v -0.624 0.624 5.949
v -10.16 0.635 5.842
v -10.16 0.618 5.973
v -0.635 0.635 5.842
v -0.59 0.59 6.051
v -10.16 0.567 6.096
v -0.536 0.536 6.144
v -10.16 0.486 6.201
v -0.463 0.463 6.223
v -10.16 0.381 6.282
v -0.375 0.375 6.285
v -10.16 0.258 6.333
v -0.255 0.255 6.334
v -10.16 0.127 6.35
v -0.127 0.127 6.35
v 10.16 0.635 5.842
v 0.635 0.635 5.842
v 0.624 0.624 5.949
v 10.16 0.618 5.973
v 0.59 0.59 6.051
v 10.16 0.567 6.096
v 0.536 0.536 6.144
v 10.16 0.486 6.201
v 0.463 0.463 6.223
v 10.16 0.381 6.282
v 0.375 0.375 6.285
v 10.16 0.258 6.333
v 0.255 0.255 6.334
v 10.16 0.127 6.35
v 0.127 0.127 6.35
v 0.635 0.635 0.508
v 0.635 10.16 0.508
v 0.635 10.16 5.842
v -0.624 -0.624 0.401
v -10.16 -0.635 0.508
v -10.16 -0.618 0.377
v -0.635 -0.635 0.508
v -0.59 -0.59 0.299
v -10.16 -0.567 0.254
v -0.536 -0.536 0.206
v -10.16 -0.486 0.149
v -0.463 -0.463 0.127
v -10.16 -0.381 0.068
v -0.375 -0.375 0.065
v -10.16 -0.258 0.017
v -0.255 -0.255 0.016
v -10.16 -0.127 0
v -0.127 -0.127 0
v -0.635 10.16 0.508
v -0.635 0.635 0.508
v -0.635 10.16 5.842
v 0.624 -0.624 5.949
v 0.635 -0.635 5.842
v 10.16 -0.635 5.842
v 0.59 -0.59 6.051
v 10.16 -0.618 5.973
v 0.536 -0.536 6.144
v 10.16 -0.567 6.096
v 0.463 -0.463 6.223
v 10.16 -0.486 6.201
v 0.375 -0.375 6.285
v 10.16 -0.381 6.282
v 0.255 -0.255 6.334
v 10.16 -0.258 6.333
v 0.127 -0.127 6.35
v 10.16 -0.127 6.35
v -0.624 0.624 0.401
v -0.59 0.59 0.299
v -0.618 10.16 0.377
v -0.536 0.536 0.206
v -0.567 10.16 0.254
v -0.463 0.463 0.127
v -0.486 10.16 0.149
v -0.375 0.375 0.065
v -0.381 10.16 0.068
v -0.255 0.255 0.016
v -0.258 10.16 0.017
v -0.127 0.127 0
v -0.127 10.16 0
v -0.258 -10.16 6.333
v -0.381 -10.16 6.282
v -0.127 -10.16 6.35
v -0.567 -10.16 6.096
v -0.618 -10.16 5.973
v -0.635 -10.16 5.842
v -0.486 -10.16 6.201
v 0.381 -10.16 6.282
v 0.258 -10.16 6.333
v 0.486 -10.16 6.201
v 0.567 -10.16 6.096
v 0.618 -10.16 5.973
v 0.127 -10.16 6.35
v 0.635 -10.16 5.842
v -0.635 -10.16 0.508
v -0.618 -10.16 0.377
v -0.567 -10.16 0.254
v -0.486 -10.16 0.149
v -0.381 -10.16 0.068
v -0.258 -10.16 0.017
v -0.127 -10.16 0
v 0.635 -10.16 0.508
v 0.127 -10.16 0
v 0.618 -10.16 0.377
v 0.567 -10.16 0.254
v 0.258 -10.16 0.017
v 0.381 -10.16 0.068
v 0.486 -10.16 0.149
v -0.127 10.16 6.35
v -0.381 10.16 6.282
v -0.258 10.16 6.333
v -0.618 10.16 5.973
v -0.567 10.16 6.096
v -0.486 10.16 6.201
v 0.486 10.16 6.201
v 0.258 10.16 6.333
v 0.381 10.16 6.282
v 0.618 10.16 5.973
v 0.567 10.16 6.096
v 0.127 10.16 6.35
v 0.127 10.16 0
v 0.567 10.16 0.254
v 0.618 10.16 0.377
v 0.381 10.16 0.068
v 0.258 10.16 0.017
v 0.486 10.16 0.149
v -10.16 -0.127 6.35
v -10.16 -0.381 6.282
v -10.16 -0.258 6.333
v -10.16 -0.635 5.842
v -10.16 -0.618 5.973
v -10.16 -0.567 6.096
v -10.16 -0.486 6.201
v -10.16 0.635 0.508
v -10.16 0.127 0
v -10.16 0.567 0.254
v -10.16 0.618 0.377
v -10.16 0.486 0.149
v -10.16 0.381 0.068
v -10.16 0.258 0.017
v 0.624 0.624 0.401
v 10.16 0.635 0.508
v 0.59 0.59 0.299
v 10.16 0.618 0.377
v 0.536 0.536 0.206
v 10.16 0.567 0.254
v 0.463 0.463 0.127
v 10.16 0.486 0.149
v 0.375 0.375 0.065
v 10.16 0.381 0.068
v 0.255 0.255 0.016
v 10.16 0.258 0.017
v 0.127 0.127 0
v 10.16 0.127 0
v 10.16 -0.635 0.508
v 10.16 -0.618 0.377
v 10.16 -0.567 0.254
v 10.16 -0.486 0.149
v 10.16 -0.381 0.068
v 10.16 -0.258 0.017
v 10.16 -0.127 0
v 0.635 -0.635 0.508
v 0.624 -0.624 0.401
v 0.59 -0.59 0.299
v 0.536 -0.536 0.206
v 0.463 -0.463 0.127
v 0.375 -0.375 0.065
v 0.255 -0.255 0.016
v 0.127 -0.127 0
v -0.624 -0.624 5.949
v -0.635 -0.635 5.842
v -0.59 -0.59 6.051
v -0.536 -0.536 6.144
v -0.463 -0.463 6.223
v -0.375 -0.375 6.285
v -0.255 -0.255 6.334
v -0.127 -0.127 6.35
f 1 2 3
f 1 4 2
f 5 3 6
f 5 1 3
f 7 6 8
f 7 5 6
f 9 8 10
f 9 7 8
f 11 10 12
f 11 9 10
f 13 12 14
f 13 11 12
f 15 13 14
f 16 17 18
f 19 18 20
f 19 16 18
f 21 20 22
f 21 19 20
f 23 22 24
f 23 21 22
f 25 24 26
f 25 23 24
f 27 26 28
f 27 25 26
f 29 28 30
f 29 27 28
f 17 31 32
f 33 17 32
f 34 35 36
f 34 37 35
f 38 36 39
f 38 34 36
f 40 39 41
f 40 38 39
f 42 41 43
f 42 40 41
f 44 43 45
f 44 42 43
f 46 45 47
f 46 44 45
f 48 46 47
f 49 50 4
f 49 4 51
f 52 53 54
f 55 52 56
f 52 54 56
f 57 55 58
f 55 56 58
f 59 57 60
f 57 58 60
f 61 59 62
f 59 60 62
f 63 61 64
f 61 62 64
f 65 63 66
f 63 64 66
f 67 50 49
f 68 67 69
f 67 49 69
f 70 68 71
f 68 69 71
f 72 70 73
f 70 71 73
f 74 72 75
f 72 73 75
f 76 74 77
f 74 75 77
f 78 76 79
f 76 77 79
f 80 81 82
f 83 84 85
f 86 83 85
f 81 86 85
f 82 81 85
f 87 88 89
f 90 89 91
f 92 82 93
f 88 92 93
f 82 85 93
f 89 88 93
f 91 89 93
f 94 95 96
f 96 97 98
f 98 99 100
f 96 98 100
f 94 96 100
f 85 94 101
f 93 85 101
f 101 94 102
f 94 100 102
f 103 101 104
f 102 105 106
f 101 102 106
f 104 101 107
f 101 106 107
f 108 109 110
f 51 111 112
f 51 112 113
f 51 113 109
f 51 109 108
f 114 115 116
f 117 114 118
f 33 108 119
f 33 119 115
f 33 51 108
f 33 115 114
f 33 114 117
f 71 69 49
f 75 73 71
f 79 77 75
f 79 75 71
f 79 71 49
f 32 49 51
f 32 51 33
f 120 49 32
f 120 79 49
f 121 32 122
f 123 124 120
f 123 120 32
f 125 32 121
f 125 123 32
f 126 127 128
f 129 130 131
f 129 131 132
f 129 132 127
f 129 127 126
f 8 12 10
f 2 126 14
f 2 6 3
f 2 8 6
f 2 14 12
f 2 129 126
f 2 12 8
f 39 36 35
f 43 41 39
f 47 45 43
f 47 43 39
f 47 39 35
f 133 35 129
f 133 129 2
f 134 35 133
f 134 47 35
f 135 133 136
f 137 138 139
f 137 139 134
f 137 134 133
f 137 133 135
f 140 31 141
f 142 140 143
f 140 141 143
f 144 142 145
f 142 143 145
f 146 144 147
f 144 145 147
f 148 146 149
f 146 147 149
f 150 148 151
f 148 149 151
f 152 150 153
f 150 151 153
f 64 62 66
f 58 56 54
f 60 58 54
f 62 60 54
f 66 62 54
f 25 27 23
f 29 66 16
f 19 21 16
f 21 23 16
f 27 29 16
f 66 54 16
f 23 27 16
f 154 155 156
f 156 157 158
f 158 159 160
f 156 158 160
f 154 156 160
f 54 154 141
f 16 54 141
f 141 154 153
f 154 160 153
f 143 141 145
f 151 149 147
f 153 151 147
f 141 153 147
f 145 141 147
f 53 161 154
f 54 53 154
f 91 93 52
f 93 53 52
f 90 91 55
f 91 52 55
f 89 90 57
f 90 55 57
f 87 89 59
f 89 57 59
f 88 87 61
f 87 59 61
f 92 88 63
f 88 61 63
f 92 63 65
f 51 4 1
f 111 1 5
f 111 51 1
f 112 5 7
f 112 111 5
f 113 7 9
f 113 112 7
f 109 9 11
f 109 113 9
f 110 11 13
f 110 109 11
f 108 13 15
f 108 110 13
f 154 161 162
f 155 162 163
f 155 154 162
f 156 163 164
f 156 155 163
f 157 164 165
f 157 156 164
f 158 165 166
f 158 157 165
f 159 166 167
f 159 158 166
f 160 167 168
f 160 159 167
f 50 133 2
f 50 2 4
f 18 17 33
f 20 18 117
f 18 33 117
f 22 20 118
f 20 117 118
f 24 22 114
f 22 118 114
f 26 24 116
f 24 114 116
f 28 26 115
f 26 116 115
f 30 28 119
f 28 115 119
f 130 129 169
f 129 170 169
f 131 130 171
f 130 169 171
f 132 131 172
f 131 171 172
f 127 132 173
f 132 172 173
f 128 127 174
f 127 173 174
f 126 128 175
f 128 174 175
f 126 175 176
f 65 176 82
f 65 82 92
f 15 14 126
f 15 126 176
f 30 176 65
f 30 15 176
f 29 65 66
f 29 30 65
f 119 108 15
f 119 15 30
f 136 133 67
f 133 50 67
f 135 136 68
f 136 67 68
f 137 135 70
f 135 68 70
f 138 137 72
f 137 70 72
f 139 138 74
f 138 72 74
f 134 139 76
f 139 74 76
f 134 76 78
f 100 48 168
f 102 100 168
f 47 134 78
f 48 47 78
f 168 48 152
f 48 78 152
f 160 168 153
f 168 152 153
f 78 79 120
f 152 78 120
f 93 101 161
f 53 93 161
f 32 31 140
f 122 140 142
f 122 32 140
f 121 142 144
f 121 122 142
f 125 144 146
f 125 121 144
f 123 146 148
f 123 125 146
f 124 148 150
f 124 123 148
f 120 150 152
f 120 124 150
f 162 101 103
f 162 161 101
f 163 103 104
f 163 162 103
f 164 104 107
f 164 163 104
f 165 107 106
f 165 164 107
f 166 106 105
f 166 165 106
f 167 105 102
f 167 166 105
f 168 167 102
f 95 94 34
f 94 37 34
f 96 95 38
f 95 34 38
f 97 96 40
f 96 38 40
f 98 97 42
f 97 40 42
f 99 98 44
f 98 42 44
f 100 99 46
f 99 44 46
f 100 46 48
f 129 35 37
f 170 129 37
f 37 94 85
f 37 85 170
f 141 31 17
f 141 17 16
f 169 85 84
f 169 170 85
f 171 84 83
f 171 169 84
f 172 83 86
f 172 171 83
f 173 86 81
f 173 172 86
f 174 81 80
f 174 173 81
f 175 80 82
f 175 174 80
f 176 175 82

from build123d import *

# Parameters (mm, degrees)
F0_W     = 9.525
F0_H     = 1.27
F0_W_2   = 1.27
F0_H_2   = 9.525
F1_DEPTH = 6.35
F2_R     = 0.508


with BuildPart() as f1:
    # F0 (on Top) → F1 (new body)
    with BuildSketch(Plane.XY):
        with Locations((-5.3975, 0)):
            Rectangle(F0_W, F0_H)
        with Locations((0, 5.3975)):
            Rectangle(F0_W_2, F0_H_2)
        with Locations((5.3975, 0)):
            Rectangle(F0_W, F0_H)
        with Locations((0, -5.3975)):
            Rectangle(F0_W_2, F0_H_2)
        Rectangle(F0_W_2, F0_H)
    extrude(amount=F1_DEPTH)

    # F2
    f2_edges = [f1.edges().sort_by_distance(p)[0] for p in [
        (0.635, -5.3975, 6.35),
        (-0.635, -5.3975, 6.35),
        (-5.3975, -0.635, 6.35),
        (-5.3975, 0.635, 6.35),
        (-0.635, 5.3975, 6.35),
        (0.635, 5.3975, 6.35),
        (5.3975, 0.635, 6.35),
        (5.3975, -0.635, 6.35),
        (-5.3975, 0.635, 0),
        (-5.3975, -0.635, 0),
        (5.3975, -0.635, 0),
        (5.3975, 0.635, 0),
        (0.635, 5.3975, 0),
        (-0.635, 5.3975, 0),
        (-0.635, -5.3975, 0),
        (0.635, -5.3975, 0),
    ]]
    fillet(f2_edges, radius=F2_R)


solid = f1.part
